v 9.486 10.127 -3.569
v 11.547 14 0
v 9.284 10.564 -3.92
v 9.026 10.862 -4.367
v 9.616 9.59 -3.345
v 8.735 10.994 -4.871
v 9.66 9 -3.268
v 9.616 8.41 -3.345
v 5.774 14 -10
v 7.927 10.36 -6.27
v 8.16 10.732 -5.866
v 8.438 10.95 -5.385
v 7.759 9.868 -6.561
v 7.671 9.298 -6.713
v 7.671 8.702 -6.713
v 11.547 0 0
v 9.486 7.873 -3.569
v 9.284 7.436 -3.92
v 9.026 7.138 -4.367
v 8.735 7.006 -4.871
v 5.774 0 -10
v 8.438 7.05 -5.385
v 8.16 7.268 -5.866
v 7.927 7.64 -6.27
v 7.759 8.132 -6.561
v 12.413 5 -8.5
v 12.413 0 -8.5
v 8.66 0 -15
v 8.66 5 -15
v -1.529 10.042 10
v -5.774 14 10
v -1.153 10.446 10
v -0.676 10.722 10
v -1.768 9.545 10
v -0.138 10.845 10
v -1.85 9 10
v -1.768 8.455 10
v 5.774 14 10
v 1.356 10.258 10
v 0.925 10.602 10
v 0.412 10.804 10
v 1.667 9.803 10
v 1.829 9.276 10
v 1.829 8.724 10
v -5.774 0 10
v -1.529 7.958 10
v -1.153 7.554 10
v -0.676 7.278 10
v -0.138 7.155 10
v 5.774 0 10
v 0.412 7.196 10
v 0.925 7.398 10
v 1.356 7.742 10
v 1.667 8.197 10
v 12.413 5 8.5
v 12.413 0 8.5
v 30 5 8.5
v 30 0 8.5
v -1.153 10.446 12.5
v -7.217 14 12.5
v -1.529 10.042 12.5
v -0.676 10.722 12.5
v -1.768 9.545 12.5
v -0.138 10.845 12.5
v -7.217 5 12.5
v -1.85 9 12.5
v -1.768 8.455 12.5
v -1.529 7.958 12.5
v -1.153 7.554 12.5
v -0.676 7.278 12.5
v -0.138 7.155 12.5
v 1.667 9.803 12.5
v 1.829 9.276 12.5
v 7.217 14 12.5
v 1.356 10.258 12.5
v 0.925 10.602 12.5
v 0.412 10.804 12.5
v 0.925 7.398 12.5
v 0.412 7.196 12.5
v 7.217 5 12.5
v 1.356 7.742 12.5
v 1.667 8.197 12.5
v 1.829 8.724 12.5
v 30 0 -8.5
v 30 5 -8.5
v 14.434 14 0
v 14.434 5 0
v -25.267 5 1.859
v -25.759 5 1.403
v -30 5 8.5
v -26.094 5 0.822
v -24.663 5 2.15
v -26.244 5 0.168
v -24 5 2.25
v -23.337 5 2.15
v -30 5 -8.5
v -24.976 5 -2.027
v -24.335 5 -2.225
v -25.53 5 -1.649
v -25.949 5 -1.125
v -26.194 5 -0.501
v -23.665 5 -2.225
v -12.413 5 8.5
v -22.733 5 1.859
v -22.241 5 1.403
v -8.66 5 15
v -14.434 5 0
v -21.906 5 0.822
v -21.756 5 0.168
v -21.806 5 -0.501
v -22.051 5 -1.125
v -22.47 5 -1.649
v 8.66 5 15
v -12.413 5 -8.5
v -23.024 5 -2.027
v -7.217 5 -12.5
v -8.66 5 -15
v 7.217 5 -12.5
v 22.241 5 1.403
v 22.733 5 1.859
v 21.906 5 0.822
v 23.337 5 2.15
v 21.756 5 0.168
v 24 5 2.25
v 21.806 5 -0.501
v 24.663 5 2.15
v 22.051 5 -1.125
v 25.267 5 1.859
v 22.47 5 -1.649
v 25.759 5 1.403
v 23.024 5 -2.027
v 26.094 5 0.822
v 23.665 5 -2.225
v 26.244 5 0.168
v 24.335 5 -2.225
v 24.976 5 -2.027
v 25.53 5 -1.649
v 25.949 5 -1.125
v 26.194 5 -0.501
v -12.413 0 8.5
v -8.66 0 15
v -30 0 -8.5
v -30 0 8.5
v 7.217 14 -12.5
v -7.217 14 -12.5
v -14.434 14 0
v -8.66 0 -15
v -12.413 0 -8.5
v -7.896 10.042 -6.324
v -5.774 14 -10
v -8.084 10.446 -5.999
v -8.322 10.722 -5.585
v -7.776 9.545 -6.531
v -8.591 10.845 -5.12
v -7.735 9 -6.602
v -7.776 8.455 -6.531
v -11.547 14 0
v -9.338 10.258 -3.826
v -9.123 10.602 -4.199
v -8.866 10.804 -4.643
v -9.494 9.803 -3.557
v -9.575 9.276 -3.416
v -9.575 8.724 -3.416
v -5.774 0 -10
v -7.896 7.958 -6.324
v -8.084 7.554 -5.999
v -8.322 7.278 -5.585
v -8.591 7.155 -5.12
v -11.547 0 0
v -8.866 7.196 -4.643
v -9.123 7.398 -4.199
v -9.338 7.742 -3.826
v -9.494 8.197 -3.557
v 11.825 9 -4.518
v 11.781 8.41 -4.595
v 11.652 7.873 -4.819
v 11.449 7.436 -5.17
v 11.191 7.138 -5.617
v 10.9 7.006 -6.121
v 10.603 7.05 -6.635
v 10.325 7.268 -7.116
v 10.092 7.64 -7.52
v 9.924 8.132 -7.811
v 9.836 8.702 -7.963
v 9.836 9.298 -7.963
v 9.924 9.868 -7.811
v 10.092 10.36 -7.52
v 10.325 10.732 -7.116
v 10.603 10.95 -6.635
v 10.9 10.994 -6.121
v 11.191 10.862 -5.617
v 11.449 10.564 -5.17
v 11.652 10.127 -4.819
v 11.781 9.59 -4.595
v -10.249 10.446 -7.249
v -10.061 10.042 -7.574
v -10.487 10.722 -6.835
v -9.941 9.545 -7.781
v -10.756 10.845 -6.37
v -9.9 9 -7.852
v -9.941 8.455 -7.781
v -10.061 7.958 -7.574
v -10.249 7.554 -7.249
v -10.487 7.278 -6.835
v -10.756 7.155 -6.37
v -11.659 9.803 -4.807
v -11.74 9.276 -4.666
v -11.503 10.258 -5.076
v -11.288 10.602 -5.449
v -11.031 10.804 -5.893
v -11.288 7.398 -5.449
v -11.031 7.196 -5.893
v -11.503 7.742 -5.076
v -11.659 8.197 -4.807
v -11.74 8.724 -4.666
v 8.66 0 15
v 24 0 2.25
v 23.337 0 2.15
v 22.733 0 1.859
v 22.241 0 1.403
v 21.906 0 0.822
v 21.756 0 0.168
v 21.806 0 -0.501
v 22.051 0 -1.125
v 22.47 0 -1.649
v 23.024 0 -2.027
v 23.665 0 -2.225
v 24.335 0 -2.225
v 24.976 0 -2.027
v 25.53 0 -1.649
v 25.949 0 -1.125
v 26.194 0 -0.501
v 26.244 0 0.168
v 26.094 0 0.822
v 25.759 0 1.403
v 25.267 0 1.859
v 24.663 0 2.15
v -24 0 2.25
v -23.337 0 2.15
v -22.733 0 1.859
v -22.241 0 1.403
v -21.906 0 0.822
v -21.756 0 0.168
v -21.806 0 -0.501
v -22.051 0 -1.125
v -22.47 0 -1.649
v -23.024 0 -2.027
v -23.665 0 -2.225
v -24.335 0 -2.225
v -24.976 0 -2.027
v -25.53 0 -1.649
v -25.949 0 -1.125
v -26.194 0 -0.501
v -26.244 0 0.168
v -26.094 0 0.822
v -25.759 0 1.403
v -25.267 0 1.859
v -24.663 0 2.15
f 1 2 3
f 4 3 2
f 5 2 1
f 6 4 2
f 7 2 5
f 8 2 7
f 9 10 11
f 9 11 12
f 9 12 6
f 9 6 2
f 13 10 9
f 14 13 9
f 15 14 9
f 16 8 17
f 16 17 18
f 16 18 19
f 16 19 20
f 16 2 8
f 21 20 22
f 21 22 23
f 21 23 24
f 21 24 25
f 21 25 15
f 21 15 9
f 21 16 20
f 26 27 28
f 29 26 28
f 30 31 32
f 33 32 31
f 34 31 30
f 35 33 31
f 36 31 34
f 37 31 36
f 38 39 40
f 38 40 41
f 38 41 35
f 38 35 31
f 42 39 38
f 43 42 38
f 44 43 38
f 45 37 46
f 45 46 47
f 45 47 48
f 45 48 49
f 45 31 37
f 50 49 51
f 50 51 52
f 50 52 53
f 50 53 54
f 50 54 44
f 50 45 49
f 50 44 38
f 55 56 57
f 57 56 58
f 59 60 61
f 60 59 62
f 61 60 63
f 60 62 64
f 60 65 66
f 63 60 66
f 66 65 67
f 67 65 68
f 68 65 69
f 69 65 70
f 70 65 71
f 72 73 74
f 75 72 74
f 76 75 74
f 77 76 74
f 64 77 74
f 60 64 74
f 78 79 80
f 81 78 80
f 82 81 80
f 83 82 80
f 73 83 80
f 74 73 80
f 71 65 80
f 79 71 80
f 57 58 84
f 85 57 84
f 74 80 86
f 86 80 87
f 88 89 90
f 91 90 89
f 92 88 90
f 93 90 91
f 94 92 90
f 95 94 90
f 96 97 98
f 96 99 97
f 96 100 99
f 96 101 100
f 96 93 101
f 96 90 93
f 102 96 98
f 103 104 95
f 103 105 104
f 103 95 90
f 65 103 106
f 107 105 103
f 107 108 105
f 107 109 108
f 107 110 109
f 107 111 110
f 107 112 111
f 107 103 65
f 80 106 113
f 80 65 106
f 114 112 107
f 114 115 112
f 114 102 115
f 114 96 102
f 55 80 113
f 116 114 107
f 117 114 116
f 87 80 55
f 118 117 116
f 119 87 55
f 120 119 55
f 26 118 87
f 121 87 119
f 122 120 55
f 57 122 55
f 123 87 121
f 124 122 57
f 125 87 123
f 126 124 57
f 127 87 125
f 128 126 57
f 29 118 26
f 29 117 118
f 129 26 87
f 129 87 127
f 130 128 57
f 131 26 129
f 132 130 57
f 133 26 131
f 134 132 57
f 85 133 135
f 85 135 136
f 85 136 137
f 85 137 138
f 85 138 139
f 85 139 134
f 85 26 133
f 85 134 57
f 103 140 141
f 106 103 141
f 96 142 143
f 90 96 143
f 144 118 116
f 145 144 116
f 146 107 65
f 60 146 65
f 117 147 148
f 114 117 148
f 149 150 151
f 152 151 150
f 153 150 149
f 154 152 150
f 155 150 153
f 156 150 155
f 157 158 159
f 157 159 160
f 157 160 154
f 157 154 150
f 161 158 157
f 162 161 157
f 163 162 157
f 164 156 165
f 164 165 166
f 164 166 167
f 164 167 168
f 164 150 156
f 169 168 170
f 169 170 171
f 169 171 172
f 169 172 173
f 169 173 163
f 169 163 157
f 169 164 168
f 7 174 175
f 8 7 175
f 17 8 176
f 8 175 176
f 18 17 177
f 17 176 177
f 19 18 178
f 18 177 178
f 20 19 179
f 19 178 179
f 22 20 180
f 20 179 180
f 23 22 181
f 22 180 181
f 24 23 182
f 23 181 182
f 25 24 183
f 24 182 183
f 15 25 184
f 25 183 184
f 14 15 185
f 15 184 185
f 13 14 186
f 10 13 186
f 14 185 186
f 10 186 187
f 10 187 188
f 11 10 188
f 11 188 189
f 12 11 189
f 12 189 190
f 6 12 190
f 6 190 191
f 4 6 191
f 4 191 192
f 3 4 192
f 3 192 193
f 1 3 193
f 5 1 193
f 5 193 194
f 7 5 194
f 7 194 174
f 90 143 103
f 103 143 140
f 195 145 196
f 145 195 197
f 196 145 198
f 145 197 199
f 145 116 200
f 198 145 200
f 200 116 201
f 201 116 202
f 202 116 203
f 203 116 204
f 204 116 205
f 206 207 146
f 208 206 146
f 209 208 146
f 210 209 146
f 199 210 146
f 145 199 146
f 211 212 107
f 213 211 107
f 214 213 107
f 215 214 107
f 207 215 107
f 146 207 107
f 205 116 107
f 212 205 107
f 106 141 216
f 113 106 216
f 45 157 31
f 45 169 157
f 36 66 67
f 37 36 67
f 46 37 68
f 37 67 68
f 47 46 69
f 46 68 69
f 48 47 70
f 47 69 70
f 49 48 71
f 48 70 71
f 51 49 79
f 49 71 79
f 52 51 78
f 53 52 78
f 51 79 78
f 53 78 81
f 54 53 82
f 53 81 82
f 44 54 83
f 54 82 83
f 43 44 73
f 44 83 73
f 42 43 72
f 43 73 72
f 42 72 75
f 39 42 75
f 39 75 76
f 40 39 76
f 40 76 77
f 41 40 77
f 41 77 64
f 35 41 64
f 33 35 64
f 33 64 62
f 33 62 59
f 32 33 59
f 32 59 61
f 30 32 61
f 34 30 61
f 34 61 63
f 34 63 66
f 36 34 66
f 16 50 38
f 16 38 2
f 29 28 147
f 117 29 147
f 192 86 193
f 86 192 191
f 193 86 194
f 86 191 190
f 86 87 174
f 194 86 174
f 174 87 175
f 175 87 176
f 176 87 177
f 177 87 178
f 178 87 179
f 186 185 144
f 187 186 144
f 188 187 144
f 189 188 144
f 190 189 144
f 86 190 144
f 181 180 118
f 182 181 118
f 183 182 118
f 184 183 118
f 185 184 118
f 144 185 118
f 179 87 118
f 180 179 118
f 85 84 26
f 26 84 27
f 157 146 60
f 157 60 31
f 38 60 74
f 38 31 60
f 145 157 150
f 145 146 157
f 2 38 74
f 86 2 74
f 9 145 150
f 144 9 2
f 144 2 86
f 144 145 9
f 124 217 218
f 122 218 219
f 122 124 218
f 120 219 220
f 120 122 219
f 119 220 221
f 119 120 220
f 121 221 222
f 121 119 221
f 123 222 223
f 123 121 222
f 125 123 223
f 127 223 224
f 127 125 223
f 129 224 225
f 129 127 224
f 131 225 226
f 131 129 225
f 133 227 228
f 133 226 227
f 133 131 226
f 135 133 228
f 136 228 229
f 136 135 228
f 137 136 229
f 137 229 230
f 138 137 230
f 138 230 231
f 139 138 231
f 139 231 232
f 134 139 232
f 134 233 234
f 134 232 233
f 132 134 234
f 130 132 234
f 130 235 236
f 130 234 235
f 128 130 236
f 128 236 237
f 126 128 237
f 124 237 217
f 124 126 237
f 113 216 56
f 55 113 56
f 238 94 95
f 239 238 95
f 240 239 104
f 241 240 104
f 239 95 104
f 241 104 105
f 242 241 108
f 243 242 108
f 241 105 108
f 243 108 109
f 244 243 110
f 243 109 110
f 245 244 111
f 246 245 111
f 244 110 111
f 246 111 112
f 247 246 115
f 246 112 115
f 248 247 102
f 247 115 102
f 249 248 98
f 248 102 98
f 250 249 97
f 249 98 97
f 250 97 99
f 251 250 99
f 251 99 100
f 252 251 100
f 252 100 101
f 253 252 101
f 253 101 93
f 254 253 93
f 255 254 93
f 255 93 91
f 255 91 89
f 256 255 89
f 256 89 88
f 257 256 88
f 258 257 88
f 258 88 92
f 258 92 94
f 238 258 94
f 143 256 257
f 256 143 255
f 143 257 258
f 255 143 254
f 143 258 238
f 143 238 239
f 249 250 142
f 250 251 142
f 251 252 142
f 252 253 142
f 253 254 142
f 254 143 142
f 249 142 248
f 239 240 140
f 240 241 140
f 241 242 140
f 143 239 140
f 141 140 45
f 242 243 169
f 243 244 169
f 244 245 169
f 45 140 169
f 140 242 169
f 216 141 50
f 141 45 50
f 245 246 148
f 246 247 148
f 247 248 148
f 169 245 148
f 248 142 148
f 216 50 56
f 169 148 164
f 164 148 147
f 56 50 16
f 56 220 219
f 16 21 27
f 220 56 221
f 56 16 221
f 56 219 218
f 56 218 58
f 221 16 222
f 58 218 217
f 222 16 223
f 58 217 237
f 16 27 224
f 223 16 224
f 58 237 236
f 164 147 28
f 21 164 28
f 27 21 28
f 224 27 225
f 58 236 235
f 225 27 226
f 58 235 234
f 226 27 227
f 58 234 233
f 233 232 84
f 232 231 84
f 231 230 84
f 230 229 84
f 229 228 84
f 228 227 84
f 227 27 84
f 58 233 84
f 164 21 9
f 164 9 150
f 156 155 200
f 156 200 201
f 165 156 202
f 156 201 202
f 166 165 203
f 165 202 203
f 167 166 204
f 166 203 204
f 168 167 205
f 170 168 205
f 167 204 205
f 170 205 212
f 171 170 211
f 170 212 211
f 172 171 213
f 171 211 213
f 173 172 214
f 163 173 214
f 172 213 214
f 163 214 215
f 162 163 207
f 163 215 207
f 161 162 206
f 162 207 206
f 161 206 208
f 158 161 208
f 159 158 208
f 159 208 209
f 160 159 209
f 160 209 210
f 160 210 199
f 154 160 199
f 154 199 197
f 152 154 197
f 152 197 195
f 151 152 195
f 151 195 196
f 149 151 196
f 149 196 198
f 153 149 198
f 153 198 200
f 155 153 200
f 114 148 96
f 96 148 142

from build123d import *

# Parameters (mm, degrees)
BOSS_EXTRUDE1_DEPTH = 5
BOSS_EXTRUDE2_DEPTH = 9
SKETCH4_R           = 2.25
CUT_EXTRUDE1_DEPTH  = 6
SKETCH5_R           = 1.85
CUT_EXTRUDE2_DEPTH  = 5
SKETCH6_R           = 2
CUT_EXTRUDE3_DEPTH  = 5
SKETCH7_R           = 1.85
CUT_EXTRUDE4_DEPTH  = 5


with BuildPart() as part:
    # Sketch1 → Boss-Extrude1 (new body)
    with BuildSketch(Plane(origin=(0, 0, 0), x_dir=(1, 0, 0), z_dir=(0, 1, 0))):
        Polygon((-30, -8.5), (-12.413030788, -8.5), (-8.660254038, -15), (8.660254038, -15), (12.413030788, -8.5), (30, -8.5), (30, 8.5), (12.413030788, 8.5), (8.660254038, 15), (-8.660254038, 15), (-12.413030788, 8.5), (-30, 8.5), align=None)
        Polygon((-5.773502692, -10), (-11.547005384, 0), (-5.773502692, 10), (5.773502692, 10), (11.547005384, 0), (5.773502692, -10), align=None, mode=Mode.SUBTRACT)
    extrude(amount=BOSS_EXTRUDE1_DEPTH)

    # Sketch3 → Boss-Extrude2 (add)
    with BuildSketch(Plane(origin=(0, 5, 0), x_dir=(1, 0, 0), z_dir=(0, 1, 0))):
        Polygon((-14.43375673, 0), (-7.216878365, -12.5), (7.216878365, -12.5), (14.43375673, 0), (7.216878365, 12.5), (-7.216878365, 12.5), align=None)
        Polygon((-11.547005384, 0), (-5.773502692, -10), (5.773502692, -10), (11.547005384, 0), (5.773502692, 10), (-5.773502692, 10), align=None, mode=Mode.SUBTRACT)
    extrude(amount=BOSS_EXTRUDE2_DEPTH)

    # Sketch4 → Cut-Extrude1 (cut, through all)
    with BuildSketch(Plane(origin=(0, 5, 0), x_dir=(1, 0, 0), z_dir=(0, 1, 0))):
        with Locations(Location((-24, 0, 0), (0, 0, 270))):  # turned: the seam where the file's is
            Circle(SKETCH4_R)
    cut_extrude1 = extrude(amount=-CUT_EXTRUDE1_DEPTH, mode=Mode.SUBTRACT)

    # Mirror1: Cut-Extrude1 across plane
    add(cut_extrude1.mirror(Plane(origin=(0, 0, 0), x_dir=(0, 0, 1), z_dir=(1, 0, 0))), mode=Mode.SUBTRACT)

    # Sketch5 → Cut-Extrude2 (cut)
    with BuildSketch(Plane.XY.offset(15)):
        with Locations(Location((0, 9, 0), (0, 0, 180))):  # turned: the seam where the file's is
            Circle(SKETCH5_R)
    extrude(amount=-CUT_EXTRUDE2_DEPTH, mode=Mode.SUBTRACT)

    # Sketch6 → Cut-Extrude3 (cut)
    with BuildSketch(Plane(origin=(12.990381057, 0, -7.5), x_dir=(-0.5, 0, -0.866025404), z_dir=(0.866025404, 0, -0.5))):
        with Locations(Location((0, 9, 0), (0, 0, 180))):  # turned: the seam where the file's is
            Circle(SKETCH6_R)
    extrude(amount=-CUT_EXTRUDE3_DEPTH, mode=Mode.SUBTRACT)

    # Sketch7 → Cut-Extrude4 (cut)
    with BuildSketch(Plane(origin=(-12.990381057, 0, -7.5), x_dir=(-0.5, 0, 0.866025404), z_dir=(-0.866025404, 0, -0.5))):
        with Locations(Location((0, 9, 0), (0, 0, 180))):  # turned: the seam where the file's is
            Circle(SKETCH7_R)
    extrude(amount=-CUT_EXTRUDE4_DEPTH, mode=Mode.SUBTRACT)


solid = part.part
